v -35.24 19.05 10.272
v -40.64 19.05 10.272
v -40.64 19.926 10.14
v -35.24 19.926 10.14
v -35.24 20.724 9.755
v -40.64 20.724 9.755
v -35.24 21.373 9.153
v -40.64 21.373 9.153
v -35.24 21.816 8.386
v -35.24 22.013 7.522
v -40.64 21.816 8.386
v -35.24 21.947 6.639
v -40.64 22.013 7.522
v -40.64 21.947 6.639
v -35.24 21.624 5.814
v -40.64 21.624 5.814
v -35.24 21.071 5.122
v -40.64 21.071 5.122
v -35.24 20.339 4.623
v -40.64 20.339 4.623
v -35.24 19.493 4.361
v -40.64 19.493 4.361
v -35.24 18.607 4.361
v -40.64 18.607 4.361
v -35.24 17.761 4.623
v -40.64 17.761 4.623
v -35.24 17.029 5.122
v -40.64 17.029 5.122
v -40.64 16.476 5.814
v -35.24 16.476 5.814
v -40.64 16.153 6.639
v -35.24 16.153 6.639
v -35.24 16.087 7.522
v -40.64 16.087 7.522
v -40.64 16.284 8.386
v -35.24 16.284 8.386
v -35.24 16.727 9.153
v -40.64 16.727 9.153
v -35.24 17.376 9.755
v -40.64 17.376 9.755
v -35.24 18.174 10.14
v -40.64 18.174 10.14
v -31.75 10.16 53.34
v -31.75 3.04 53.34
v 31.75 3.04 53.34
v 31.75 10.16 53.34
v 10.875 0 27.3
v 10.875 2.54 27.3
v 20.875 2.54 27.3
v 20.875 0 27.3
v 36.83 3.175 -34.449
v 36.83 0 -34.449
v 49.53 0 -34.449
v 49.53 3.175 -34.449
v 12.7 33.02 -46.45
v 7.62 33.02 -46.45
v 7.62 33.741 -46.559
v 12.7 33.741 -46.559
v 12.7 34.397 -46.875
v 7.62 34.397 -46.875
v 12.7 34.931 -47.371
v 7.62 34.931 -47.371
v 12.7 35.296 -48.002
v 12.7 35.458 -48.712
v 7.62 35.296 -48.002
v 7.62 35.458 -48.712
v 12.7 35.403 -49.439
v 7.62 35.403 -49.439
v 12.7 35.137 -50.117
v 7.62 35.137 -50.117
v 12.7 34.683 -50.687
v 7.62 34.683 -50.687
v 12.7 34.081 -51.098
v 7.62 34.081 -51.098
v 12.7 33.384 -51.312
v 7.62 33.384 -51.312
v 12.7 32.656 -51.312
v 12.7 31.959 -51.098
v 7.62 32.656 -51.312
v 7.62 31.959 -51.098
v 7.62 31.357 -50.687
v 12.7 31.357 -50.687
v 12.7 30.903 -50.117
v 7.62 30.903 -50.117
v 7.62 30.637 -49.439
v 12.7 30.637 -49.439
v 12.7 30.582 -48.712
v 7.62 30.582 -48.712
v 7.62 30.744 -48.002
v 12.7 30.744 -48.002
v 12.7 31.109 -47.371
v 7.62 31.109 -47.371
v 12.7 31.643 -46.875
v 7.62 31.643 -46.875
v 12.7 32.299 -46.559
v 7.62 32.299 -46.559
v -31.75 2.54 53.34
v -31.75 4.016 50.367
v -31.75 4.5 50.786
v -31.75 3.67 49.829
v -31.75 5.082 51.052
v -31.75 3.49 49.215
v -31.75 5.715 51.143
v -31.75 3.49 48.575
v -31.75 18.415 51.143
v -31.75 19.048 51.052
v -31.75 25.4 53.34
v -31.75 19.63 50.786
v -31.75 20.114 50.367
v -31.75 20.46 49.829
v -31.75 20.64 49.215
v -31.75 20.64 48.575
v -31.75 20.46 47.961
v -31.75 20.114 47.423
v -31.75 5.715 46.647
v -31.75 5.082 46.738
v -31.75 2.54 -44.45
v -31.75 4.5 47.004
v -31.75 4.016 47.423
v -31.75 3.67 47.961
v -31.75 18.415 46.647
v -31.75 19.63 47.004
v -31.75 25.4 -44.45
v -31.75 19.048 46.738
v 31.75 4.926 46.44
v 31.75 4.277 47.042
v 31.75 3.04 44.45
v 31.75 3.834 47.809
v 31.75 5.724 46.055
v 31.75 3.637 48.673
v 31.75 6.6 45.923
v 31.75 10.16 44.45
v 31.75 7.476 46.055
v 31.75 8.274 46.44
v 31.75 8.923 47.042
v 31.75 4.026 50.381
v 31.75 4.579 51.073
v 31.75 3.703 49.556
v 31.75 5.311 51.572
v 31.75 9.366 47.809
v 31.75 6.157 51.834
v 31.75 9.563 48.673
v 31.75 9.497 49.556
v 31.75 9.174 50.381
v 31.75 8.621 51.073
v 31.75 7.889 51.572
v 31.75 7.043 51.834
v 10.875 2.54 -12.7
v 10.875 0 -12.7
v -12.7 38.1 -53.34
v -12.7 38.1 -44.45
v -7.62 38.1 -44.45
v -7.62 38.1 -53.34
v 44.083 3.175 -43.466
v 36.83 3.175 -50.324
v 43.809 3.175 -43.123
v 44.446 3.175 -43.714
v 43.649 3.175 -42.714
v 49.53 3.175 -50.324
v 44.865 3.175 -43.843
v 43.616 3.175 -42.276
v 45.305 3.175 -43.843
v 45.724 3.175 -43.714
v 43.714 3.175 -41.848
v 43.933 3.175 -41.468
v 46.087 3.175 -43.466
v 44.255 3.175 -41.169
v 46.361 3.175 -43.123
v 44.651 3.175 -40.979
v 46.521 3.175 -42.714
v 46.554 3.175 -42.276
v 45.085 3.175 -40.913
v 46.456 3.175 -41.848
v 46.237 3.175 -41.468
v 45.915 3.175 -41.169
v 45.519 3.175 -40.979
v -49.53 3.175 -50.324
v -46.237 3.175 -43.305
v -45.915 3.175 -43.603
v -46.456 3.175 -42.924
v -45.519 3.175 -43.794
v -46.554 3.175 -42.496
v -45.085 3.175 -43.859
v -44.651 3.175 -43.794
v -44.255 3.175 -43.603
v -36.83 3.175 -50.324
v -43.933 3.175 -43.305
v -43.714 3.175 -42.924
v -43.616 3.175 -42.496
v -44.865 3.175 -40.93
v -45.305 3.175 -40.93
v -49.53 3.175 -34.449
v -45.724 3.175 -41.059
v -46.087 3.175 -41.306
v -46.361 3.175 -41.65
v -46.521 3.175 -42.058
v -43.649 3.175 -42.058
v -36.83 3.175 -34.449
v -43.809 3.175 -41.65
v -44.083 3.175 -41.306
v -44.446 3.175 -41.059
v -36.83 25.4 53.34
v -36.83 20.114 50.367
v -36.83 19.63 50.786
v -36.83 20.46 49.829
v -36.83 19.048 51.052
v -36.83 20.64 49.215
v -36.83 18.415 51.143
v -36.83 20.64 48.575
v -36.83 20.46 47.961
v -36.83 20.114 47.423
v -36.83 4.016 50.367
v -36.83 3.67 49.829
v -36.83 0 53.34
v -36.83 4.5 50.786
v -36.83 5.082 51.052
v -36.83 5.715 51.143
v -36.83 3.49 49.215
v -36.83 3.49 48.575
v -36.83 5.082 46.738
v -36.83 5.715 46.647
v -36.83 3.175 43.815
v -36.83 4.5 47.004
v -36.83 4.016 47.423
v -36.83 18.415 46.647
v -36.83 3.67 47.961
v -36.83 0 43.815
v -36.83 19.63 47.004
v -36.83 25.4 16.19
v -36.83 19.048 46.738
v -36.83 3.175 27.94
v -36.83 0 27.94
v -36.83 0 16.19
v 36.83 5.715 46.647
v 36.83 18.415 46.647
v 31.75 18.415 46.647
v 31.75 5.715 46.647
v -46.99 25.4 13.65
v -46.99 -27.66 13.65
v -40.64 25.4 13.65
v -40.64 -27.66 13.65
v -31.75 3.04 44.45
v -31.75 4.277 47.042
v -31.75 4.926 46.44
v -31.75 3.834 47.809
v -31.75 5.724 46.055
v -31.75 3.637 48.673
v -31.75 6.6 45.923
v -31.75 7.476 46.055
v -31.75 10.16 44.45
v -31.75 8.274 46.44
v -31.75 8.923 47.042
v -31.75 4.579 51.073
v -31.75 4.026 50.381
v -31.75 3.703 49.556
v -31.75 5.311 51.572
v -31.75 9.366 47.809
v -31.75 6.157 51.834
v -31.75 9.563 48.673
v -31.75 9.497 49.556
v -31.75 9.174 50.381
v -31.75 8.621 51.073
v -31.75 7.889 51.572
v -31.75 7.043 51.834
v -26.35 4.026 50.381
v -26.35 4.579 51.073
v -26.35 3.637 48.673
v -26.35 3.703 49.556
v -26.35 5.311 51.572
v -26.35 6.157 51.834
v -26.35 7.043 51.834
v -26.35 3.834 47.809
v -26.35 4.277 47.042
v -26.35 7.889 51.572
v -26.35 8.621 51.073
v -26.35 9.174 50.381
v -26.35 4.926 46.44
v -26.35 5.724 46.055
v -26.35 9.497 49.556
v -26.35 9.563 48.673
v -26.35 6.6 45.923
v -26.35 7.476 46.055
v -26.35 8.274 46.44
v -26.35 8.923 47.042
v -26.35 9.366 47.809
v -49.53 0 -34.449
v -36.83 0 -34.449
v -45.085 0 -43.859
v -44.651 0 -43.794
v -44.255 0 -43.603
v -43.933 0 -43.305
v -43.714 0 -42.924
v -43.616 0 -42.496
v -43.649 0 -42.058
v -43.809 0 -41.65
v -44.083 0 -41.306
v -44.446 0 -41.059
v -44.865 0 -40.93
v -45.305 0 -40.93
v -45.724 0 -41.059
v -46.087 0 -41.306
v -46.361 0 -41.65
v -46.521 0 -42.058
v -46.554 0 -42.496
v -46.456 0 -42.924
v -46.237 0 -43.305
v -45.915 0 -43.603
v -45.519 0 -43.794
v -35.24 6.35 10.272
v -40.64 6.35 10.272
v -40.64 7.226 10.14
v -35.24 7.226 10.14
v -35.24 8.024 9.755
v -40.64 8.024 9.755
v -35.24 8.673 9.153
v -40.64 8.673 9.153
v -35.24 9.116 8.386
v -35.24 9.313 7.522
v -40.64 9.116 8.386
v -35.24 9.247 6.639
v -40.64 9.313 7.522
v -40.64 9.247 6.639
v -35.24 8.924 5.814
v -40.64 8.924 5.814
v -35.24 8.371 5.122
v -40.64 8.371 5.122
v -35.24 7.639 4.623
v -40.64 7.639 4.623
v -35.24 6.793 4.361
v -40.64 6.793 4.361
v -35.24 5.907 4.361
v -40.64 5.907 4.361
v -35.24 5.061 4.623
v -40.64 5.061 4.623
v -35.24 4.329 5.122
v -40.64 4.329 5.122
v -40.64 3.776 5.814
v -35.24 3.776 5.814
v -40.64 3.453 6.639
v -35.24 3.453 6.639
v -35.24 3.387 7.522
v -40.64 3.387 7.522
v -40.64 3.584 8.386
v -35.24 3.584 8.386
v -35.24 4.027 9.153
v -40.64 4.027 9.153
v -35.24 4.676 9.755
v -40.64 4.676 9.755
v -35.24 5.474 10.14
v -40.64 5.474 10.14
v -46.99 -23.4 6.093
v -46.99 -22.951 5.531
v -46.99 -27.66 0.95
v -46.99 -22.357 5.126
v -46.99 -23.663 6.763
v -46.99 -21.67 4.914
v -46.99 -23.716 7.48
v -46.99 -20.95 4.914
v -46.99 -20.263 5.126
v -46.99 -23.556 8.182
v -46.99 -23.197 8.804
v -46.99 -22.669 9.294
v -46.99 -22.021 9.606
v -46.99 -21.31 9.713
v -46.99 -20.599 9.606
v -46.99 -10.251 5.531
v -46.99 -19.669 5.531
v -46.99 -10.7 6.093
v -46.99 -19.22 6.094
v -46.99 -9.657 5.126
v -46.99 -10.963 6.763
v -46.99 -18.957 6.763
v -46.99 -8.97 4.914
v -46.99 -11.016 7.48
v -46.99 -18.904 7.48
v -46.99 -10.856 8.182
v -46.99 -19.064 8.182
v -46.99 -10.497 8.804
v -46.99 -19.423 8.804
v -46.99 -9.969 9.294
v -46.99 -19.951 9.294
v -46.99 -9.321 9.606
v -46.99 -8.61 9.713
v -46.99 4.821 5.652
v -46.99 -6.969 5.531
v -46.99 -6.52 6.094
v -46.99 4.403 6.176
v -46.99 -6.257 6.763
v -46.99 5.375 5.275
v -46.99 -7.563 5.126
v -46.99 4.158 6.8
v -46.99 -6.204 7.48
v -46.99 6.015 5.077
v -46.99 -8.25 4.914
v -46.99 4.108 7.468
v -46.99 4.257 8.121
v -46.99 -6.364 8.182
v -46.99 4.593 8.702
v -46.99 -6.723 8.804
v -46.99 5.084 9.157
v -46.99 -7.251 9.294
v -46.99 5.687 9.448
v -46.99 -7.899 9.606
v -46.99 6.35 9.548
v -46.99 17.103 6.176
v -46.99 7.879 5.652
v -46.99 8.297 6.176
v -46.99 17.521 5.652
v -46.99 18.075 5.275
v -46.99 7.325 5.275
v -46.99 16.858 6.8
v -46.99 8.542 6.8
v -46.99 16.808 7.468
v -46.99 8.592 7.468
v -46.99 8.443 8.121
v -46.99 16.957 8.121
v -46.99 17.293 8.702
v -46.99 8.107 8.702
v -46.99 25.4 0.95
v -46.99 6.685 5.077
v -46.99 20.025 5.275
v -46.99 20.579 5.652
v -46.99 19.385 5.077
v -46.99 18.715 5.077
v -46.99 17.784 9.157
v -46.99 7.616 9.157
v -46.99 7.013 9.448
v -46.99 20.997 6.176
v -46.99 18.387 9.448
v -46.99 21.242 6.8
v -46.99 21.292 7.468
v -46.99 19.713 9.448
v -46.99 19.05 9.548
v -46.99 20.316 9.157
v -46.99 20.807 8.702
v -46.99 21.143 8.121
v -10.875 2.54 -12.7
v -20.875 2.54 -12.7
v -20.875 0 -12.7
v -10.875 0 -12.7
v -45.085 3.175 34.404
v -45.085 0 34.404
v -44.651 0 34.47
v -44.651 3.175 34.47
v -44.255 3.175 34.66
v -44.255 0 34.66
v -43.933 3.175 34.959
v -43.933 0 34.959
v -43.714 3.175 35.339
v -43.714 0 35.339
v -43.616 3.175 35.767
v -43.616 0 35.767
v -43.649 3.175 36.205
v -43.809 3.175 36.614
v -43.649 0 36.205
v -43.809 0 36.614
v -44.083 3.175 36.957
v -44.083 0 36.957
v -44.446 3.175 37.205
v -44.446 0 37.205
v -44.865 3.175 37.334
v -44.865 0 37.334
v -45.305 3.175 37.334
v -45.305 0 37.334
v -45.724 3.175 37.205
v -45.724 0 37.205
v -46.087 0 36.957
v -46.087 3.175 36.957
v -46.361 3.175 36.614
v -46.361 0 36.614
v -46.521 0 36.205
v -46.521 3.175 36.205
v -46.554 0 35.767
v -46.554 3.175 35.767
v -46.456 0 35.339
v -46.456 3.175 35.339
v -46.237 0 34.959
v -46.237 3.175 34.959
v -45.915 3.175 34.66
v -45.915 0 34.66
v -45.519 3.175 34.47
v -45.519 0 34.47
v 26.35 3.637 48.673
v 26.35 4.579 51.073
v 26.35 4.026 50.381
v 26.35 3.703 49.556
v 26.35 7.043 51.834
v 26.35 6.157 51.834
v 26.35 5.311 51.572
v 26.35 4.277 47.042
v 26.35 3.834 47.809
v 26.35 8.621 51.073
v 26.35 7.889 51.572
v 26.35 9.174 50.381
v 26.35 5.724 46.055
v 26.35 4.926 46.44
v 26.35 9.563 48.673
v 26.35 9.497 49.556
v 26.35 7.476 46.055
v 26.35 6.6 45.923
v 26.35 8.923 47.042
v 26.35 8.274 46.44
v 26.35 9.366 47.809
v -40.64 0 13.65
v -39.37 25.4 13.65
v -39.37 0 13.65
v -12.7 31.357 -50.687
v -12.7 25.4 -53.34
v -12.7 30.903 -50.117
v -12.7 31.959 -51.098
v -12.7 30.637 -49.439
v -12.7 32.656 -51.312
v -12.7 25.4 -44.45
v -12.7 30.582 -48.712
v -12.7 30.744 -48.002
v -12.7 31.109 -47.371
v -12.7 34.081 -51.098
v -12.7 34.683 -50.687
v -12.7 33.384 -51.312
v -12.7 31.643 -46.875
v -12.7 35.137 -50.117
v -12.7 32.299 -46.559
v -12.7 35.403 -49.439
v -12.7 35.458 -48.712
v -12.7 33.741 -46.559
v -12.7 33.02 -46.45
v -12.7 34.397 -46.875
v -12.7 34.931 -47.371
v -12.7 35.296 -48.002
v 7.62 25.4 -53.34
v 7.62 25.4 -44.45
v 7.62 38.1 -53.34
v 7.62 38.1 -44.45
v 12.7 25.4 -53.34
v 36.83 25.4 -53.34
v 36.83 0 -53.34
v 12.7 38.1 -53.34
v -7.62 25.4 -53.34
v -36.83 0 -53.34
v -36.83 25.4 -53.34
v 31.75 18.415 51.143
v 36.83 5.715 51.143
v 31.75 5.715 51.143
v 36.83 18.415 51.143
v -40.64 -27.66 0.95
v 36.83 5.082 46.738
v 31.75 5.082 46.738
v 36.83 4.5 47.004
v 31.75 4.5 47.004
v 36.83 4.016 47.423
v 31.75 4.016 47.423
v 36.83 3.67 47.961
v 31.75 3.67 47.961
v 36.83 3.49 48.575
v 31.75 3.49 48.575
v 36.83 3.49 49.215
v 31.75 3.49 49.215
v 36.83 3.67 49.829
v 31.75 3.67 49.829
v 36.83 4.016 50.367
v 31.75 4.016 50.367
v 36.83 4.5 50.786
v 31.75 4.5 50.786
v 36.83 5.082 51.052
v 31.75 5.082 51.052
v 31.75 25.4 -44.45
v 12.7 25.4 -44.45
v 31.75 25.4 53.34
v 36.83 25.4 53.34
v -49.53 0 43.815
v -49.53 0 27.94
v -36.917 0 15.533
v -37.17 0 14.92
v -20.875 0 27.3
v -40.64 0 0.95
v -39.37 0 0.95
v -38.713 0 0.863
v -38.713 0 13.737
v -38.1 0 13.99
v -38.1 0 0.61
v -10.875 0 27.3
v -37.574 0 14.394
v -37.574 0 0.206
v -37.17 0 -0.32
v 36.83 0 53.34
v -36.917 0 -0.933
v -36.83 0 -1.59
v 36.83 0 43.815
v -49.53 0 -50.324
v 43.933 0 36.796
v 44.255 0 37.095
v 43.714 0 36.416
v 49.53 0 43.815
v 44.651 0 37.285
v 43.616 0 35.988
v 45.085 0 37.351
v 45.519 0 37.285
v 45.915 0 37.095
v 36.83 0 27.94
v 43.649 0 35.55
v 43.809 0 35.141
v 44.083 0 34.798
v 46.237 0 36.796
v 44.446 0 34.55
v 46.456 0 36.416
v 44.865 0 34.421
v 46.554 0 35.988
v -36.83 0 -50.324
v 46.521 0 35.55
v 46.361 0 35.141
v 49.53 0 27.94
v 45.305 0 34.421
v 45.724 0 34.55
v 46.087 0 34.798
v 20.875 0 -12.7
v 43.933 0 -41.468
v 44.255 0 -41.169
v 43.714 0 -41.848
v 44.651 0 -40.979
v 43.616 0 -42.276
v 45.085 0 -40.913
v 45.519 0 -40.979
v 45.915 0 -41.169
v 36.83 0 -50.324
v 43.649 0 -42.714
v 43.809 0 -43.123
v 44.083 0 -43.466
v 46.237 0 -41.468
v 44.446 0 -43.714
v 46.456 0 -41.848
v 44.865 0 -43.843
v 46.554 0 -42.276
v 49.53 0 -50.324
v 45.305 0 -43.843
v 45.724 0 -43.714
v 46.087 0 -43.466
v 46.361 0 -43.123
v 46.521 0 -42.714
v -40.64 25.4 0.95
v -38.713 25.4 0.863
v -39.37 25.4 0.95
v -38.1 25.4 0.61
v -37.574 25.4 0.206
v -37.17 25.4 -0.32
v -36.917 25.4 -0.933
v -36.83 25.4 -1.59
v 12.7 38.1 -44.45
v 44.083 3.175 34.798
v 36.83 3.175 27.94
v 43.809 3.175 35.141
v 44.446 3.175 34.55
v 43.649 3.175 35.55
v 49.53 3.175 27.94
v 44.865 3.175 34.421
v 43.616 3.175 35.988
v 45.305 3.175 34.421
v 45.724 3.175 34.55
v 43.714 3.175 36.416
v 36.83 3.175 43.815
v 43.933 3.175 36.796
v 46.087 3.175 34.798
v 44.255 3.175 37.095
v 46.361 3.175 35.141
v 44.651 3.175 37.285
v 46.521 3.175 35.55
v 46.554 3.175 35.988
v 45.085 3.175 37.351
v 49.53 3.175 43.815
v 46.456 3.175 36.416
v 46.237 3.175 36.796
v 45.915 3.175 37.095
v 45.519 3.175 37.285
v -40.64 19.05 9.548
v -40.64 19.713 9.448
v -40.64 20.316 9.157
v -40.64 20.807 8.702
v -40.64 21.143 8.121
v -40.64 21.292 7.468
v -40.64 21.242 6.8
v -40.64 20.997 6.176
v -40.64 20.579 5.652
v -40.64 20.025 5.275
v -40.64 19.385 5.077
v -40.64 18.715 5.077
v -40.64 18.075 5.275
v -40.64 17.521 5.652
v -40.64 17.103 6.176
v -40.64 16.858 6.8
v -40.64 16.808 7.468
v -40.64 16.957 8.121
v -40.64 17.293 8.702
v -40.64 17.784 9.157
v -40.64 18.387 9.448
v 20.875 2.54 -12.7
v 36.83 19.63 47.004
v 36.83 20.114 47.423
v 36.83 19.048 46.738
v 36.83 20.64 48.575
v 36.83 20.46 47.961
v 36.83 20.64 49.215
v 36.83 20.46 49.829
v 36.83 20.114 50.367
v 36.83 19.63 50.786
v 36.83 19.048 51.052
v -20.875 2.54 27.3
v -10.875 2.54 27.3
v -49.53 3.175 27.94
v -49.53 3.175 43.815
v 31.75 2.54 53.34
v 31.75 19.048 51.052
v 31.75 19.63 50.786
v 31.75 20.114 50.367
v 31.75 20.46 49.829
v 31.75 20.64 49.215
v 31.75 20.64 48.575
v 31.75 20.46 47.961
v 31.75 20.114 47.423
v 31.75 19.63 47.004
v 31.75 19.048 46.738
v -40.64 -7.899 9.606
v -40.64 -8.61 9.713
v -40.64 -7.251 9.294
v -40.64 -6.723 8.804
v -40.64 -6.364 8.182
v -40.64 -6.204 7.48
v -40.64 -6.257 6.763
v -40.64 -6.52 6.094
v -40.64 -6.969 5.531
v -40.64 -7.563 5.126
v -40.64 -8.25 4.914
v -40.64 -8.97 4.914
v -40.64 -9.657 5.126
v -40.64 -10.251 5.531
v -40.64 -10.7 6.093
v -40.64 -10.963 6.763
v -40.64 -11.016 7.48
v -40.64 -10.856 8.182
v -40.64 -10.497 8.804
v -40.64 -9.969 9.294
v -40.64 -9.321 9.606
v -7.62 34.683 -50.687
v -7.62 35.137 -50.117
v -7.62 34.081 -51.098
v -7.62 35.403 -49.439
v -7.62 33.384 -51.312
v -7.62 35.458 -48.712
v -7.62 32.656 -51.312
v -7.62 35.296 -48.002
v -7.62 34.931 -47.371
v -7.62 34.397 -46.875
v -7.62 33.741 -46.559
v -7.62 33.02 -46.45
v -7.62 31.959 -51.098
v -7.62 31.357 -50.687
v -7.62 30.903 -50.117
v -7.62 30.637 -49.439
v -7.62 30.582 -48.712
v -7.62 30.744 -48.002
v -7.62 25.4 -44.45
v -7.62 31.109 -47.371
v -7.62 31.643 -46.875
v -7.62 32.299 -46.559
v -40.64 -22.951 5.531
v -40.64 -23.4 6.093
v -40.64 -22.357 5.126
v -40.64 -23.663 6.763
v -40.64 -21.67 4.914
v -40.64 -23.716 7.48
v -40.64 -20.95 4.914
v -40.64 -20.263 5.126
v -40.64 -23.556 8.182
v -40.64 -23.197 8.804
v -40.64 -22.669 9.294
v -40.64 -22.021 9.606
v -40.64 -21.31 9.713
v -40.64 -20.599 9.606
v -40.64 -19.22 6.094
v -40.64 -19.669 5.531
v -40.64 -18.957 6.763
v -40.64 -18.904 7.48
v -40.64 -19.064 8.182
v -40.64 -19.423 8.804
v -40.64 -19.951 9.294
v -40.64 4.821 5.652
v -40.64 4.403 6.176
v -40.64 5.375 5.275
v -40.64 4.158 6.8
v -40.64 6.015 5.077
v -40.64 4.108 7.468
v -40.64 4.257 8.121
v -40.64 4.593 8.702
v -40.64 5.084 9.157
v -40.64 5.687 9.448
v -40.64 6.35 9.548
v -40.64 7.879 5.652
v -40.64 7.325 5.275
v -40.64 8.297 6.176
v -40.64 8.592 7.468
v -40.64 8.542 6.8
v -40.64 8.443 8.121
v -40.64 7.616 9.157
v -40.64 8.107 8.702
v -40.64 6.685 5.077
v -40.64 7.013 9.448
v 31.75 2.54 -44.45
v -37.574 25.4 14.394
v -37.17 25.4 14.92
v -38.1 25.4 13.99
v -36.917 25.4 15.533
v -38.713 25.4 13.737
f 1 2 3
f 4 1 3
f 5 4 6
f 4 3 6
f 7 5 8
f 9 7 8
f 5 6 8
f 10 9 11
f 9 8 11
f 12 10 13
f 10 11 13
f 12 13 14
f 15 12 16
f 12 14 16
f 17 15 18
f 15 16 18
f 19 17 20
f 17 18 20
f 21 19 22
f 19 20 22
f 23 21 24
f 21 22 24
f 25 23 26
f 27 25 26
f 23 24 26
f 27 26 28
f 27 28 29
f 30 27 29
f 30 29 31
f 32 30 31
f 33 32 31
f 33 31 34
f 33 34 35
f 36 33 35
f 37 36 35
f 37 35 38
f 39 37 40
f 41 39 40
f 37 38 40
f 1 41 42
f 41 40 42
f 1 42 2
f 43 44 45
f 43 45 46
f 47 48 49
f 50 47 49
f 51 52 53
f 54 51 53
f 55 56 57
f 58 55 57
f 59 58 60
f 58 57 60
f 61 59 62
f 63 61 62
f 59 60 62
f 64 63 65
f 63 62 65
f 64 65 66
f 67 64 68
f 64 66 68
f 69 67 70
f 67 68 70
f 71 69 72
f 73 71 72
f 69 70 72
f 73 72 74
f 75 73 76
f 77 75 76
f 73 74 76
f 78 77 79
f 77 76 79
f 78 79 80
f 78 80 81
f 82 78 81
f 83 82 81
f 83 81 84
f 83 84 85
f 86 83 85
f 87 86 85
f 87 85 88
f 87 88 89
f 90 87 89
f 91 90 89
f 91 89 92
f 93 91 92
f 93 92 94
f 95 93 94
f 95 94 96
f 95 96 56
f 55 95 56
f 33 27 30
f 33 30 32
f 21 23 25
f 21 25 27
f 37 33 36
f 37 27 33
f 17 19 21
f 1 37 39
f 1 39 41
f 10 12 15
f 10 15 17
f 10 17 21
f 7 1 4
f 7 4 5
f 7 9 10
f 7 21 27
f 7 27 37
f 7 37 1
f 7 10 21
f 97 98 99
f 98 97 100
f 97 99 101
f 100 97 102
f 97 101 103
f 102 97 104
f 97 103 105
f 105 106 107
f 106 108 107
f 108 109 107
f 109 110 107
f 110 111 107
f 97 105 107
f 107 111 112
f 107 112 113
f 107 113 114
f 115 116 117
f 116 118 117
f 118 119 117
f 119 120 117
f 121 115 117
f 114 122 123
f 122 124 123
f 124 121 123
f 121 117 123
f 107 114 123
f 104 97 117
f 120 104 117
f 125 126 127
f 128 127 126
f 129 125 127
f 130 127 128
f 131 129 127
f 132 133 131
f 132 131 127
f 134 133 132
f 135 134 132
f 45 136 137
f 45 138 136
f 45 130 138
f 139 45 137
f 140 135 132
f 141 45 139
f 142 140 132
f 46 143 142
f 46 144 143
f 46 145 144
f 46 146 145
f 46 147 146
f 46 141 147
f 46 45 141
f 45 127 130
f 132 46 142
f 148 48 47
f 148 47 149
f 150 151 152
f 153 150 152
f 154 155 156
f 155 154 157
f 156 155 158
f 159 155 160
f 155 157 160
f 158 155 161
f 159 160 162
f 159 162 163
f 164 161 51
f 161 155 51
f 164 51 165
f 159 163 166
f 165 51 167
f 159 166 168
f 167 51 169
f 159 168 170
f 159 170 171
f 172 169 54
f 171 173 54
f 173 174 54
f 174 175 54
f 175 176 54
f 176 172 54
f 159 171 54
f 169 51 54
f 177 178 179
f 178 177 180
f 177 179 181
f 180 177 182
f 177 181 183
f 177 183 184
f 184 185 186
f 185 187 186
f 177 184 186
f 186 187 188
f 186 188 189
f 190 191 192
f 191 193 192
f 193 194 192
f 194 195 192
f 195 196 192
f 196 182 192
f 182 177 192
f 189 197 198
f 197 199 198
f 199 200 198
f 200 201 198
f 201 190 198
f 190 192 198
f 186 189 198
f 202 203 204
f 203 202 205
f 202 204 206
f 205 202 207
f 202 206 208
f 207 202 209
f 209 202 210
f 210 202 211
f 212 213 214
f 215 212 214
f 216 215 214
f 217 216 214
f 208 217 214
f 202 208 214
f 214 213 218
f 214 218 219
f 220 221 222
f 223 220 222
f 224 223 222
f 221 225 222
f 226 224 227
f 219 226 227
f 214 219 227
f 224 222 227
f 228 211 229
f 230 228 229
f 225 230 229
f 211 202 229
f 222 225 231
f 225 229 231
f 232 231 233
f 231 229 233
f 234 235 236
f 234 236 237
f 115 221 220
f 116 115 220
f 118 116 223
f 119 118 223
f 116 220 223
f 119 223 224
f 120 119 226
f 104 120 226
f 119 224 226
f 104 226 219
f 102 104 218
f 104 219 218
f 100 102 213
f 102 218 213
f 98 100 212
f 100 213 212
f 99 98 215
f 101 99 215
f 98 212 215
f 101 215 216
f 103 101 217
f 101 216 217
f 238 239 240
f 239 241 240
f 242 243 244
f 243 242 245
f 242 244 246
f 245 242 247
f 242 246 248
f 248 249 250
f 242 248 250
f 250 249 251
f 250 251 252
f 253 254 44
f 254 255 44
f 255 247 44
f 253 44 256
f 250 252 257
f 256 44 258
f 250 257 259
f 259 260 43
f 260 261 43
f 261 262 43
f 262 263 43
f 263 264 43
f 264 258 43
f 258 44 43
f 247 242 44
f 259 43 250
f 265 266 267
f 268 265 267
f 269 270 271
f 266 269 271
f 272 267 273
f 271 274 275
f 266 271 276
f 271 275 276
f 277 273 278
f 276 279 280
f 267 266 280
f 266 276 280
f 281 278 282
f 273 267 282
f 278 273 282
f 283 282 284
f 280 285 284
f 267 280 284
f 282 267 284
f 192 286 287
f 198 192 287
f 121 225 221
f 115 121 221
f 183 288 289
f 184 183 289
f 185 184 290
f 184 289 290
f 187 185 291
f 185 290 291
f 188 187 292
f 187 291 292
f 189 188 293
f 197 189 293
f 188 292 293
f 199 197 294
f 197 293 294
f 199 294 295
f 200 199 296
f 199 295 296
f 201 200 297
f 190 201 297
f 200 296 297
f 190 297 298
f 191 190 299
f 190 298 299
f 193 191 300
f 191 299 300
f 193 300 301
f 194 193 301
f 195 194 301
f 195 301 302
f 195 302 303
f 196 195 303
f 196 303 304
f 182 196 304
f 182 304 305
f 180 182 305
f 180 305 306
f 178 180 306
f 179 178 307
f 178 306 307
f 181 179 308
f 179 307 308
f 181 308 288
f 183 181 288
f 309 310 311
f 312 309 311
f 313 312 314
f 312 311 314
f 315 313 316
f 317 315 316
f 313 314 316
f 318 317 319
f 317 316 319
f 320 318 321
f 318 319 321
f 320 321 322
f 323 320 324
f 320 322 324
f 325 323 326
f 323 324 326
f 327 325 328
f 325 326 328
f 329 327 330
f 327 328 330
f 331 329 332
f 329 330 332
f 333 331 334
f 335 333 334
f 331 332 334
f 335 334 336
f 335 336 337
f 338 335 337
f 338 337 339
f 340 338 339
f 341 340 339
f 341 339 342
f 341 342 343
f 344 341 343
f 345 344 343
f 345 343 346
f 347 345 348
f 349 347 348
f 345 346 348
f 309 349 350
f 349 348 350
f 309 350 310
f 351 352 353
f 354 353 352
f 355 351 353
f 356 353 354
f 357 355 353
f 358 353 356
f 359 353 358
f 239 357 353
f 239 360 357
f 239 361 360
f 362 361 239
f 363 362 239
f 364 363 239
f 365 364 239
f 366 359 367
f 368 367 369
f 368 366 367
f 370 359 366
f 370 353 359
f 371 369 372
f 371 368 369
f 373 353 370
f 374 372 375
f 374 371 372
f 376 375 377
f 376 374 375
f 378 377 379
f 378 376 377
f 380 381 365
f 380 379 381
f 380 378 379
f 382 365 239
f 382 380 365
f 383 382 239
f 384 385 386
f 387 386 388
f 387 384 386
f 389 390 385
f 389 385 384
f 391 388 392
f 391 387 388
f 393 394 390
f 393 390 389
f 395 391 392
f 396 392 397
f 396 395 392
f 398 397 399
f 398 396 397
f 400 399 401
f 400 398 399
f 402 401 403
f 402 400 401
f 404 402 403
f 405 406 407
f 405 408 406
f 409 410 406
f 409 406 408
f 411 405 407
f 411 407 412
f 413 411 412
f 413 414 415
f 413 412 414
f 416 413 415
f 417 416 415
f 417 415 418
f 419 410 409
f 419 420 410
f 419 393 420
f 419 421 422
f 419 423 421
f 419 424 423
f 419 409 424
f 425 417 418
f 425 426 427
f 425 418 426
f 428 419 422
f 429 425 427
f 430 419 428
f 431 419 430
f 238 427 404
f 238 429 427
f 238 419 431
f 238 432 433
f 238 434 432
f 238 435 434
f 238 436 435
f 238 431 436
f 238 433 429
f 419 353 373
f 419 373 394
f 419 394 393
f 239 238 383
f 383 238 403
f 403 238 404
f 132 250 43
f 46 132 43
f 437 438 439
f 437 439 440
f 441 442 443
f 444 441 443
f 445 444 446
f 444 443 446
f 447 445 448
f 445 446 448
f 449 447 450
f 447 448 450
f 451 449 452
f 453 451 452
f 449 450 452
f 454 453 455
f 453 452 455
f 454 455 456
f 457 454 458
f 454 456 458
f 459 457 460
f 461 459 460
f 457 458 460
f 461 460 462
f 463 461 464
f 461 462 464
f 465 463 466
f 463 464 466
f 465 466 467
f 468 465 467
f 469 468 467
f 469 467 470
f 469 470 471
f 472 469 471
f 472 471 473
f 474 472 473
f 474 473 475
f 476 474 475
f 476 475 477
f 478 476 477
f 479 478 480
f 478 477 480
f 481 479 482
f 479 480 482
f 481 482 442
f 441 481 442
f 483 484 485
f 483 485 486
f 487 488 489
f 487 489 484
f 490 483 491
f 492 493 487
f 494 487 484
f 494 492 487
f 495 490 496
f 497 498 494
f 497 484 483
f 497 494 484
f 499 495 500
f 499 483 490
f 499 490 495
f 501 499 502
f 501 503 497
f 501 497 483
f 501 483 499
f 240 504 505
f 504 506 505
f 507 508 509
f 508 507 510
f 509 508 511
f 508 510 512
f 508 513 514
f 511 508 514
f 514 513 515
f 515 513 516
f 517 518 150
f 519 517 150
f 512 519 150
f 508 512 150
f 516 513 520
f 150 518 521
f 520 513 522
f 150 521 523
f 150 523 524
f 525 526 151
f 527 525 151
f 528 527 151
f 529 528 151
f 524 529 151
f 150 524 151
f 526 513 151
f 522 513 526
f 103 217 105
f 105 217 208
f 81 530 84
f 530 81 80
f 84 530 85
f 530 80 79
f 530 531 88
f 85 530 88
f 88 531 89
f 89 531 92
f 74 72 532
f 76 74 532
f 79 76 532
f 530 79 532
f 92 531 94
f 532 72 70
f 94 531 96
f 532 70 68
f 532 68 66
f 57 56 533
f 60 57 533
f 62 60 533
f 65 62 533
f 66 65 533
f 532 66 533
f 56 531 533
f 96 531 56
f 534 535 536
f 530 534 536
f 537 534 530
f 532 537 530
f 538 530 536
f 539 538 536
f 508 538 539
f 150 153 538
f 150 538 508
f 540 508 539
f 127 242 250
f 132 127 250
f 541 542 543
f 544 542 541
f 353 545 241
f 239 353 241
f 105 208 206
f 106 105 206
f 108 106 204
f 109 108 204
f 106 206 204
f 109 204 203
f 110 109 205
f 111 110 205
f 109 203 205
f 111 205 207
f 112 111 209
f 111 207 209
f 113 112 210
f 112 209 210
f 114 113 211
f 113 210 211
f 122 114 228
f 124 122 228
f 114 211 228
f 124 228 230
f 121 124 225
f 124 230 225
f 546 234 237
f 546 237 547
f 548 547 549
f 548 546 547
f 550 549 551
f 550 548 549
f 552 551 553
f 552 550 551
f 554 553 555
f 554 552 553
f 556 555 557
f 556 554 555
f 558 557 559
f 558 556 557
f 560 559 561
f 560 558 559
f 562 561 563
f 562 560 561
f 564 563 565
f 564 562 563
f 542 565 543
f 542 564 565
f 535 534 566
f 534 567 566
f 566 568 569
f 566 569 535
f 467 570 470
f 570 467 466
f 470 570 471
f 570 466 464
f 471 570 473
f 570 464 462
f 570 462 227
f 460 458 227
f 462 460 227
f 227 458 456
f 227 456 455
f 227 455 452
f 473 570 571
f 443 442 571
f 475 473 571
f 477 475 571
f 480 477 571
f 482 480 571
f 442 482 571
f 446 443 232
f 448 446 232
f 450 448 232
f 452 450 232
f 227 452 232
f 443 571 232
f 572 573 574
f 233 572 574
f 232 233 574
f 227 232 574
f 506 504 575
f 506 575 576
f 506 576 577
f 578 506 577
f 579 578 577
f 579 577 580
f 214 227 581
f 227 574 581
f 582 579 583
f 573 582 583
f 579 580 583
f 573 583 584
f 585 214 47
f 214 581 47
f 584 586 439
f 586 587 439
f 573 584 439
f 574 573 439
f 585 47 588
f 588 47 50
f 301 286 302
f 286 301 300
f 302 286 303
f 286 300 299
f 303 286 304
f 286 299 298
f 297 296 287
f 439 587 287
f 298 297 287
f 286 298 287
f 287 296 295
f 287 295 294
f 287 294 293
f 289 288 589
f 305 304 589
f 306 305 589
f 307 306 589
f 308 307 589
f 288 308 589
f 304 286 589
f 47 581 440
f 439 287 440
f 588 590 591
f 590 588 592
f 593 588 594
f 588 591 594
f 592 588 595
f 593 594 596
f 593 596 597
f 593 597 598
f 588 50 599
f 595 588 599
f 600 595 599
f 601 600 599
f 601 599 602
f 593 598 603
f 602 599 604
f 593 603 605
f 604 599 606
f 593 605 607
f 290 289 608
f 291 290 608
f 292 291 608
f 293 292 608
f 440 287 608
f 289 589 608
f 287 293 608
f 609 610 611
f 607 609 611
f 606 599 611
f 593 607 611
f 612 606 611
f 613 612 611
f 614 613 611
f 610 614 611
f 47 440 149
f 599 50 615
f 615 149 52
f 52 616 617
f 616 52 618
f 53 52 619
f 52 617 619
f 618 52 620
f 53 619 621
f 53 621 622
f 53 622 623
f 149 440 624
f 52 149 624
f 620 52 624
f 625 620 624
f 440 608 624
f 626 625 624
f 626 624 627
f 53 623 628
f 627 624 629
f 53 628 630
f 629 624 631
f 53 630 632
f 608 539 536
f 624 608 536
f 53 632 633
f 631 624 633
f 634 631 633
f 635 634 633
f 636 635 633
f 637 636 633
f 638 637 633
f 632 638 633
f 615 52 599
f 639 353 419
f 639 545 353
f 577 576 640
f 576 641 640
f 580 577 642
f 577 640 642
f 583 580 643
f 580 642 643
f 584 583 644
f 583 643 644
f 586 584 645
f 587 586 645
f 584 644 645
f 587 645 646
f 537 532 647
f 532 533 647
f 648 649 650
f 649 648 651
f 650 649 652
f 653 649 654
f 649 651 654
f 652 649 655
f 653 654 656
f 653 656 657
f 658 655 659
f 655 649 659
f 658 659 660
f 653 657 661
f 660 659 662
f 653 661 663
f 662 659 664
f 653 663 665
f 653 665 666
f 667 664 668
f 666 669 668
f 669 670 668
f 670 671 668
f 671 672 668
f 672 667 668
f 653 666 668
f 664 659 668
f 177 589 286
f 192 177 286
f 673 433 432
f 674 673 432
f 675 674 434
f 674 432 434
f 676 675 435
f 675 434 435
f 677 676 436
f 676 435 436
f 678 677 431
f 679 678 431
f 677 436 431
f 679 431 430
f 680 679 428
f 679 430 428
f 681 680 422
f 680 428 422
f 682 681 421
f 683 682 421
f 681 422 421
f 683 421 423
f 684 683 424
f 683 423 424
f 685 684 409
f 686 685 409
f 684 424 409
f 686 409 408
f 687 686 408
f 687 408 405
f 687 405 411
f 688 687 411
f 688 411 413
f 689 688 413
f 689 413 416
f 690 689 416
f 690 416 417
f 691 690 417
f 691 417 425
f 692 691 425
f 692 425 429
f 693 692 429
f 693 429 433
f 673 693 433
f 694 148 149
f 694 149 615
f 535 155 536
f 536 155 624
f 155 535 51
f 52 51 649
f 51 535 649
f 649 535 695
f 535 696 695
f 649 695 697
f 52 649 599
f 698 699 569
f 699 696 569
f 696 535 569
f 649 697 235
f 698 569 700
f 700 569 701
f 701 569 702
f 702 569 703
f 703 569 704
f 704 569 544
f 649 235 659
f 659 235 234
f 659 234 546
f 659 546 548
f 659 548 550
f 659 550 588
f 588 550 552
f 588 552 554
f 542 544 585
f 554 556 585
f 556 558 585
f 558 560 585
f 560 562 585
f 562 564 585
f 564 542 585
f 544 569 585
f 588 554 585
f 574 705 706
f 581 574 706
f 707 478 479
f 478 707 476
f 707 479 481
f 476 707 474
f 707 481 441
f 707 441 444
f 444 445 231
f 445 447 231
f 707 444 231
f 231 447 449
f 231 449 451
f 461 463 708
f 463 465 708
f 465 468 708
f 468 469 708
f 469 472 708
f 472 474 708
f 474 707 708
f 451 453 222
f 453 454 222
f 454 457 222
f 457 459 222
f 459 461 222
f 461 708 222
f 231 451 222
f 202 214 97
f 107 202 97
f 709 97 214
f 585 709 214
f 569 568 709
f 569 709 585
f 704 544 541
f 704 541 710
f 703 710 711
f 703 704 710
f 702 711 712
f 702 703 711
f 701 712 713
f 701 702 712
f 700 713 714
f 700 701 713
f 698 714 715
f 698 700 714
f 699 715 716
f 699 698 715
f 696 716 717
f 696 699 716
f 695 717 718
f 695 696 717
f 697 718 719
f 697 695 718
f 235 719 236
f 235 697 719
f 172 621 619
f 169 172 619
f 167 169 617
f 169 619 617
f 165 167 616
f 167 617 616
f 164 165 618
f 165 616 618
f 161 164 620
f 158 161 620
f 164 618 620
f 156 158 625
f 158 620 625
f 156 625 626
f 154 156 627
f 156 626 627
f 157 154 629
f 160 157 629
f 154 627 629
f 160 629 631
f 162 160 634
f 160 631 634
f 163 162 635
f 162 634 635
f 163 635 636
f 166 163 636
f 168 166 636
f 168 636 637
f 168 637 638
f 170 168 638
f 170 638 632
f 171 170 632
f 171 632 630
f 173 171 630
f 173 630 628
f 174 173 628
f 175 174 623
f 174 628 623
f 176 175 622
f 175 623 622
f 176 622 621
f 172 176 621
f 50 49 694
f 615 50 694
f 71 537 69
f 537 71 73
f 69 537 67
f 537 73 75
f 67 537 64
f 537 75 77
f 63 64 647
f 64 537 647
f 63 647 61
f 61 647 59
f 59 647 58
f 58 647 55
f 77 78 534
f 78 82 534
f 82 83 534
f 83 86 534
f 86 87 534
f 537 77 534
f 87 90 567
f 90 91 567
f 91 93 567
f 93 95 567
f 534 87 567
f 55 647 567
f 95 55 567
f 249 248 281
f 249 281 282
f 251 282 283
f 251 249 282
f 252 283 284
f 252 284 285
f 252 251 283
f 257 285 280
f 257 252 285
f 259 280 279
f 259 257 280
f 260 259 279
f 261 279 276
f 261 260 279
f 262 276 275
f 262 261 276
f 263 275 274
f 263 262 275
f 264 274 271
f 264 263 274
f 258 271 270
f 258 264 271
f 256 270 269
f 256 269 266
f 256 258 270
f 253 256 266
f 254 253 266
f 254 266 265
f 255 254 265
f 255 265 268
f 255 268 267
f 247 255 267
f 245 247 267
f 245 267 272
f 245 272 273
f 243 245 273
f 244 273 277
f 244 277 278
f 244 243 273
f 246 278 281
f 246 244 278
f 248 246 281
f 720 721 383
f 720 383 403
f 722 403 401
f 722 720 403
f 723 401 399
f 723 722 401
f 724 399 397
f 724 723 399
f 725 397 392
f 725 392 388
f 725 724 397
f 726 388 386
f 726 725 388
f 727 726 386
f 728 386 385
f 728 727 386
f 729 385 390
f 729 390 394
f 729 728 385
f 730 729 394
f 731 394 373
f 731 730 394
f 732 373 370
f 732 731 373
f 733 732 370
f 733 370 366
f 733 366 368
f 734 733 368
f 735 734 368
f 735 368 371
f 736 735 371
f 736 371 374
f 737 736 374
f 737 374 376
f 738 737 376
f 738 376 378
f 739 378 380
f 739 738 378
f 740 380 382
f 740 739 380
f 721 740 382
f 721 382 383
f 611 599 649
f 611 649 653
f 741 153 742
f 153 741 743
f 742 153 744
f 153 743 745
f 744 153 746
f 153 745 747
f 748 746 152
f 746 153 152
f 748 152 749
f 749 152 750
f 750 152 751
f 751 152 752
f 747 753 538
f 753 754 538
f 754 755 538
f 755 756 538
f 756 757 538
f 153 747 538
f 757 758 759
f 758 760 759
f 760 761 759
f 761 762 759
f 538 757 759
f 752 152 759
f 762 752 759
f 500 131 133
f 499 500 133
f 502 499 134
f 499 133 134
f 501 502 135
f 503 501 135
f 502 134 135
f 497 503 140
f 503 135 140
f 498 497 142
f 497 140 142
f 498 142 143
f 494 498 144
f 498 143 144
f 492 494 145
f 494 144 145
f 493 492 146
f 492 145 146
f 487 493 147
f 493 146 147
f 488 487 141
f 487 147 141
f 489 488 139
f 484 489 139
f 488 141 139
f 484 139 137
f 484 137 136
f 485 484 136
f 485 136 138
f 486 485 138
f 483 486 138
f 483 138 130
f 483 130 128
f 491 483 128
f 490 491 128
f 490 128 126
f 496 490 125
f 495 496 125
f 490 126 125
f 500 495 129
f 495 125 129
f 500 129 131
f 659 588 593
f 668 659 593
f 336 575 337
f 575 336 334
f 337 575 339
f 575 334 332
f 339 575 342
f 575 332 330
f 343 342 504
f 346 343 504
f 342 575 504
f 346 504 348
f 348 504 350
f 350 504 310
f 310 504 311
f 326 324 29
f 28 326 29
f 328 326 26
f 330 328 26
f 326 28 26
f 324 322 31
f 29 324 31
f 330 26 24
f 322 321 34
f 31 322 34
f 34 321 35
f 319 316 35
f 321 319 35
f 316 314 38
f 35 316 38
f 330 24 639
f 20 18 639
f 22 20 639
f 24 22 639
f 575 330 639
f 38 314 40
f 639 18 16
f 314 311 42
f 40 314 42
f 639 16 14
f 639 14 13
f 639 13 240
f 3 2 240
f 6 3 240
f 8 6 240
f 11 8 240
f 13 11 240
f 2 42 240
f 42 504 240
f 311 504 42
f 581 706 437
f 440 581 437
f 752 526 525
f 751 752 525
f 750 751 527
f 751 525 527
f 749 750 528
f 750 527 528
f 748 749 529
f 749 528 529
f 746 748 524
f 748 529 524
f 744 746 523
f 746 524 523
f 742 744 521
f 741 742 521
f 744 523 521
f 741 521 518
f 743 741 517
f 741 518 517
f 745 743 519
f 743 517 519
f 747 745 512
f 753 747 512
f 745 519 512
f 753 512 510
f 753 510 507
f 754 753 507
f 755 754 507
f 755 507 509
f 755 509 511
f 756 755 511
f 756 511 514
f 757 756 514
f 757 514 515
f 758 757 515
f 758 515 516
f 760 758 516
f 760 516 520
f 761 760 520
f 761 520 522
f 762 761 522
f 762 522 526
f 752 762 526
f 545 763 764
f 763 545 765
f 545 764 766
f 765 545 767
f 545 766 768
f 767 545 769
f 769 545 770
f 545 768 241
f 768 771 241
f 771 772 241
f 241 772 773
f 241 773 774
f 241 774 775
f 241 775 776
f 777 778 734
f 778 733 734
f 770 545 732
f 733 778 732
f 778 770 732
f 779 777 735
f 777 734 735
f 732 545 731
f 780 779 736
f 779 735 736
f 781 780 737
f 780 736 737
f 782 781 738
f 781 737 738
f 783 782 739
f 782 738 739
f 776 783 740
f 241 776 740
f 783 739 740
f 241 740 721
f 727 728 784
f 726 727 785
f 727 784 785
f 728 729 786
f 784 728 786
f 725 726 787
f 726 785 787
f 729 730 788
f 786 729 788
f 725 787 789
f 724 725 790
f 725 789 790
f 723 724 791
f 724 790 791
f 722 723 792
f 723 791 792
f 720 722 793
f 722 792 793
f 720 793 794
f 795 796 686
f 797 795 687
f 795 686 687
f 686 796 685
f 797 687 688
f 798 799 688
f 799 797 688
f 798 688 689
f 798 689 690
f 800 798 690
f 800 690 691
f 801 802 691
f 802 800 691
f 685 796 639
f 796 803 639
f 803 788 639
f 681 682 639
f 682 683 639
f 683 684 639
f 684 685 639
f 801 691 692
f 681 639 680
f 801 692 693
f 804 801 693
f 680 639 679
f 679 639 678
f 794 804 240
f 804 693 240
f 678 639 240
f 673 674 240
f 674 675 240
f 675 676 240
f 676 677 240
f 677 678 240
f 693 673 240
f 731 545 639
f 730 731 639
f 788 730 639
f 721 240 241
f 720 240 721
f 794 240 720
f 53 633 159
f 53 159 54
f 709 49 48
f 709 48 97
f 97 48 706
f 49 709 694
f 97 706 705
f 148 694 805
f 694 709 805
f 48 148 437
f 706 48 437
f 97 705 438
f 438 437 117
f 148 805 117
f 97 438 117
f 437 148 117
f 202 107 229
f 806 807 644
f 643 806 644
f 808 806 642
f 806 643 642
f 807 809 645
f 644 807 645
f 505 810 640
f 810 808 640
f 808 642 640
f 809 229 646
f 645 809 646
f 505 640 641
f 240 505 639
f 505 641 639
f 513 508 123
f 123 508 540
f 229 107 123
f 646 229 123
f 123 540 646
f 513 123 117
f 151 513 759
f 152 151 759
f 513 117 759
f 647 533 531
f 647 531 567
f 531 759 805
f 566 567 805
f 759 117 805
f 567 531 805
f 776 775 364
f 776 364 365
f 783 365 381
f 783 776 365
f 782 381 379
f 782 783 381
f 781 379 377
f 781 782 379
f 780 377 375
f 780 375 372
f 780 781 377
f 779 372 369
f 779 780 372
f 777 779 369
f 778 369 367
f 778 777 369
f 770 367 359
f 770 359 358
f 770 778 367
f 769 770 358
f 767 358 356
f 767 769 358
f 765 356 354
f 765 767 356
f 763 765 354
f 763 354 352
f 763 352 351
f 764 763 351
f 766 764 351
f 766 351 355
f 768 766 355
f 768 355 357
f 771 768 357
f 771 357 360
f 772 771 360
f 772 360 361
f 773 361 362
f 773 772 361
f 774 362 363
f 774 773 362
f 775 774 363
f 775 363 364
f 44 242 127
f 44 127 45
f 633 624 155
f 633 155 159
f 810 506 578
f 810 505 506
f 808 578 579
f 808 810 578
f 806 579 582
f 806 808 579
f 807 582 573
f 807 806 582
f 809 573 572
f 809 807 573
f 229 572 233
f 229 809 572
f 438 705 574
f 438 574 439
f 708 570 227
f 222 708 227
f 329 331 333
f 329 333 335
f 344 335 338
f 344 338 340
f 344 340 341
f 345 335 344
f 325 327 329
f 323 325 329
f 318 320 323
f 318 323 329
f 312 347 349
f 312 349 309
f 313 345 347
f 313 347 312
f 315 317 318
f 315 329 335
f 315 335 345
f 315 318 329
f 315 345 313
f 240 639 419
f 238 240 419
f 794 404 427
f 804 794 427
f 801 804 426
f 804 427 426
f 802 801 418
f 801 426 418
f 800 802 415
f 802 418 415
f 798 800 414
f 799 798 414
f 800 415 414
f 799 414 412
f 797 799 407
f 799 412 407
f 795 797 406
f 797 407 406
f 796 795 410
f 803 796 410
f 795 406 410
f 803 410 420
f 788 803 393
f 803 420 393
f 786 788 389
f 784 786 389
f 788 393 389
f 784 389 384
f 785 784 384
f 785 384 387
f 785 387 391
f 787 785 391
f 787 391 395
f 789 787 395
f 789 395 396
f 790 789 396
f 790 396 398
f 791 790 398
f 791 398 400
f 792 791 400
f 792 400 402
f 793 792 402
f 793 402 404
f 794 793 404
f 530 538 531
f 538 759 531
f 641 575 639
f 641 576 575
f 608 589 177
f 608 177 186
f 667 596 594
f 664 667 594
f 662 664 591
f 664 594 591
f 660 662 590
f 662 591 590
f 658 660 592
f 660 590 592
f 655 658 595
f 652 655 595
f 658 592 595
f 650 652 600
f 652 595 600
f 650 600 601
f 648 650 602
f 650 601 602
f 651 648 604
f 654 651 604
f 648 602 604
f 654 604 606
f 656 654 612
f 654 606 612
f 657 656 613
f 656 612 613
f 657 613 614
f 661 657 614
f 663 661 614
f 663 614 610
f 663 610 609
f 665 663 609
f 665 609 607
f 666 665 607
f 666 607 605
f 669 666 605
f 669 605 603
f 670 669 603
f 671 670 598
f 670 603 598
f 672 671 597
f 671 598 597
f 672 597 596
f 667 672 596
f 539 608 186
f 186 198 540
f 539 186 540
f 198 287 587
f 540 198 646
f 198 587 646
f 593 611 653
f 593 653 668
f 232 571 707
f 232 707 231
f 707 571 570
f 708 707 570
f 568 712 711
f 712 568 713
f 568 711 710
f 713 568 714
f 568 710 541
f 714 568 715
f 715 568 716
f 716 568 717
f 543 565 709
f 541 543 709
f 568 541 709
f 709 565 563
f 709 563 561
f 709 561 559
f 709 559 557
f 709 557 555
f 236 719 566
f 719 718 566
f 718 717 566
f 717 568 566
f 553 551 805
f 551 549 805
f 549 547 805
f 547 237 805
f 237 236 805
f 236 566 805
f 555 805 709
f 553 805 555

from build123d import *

# Parameters (mm, degrees)
SKETCH3_W                  = 63.5
SKETCH3_H                  = 88.9
BOSS_EXTRUDE1_DEPTH        = 2.54
BOSS_EXTRUDE2_DEPTH        = 25.4
SKETCH11_W                 = 25.4
SKETCH11_H                 = 5.08
BOSS_EXTRUDE10_DEPTH       = 12.7
SKETCH12_W                 = 15.24
SKETCH12_H                 = 5.08
CUT_EXTRUDE3_DEPTH         = 12.7
BOSS_EXTRUDE11_DEPTH       = 3.81
SKETCH13_R                 = 2.44475
CUT_EXTRUDE4_DEPTH         = 83.158301467
SKETCH5_W                  = 10
SKETCH5_H                  = 40
WHEEL_CUTOUTS_DEPTH        = 74.933200255
SKETCH7_W                  = 12.7
SKETCH7_H                  = 25.4
BOSS_EXTRUDE4_DEPTH        = 3.81
SKETCH8_W                  = 12.7
SKETCH8_H                  = 53.06
SKETCH8_R                  = 2.413
BOSS_EXTRUDE5_DEPTH        = 6.35
FILLET1_R                  = 2.54
BOSS_EXTRUDE9_START        = -2.54
SKETCH9_W                  = 63.5
SKETCH9_H                  = 8.89
BOSS_EXTRUDE9_DEPTH        = 10.16
CUT_EXTRUDE2_REACH         = 116.989
SKETCH10_W                 = 63.5
SKETCH10_H                 = 0.5
SPLIT2_START               = -31.75
SPLIT2_OUTLINE_W           = 7.12
SPLIT2_OUTLINE_H           = 8.89
SPLIT2_DEPTH               = 63.5
SPLIT2_2_OUTLINE_W         = 7.12
SPLIT2_2_OUTLINE_H         = 8.89
SPLIT2_2_DEPTH             = 63.5
SKETCH15_R                 = 2.9718
HEATSERT_HOLES_DEPTH       = 5.4
EXTRA_LENGTH_DEPTH         = 3.81
SLOT_DEPTH                 = 68.58
SKETCH18_R                 = 2.9718
MOTOR_HEATSERT_HOLES_DEPTH = 5.4
SKETCH19_R                 = 2.2479
CUT_EXTRUDE6_DEPTH         = 107.407509134
SKETCH20_W                 = 12.7
SKETCH20_H                 = 15.875
SKETCH20_R                 = 1.4732
FEET_DEPTH                 = 3.175


# Read off the part's stored shape, not the designer's step: Split2, Split3
with BuildPart() as part:
    # Sketch3 → Boss-Extrude1 (new body)
    with BuildSketch(Plane(origin=(0, 0, 0), x_dir=(1, 0, 0), z_dir=(0, 1, 0))):
        Rectangle(SKETCH3_W, SKETCH3_H)
    extrude(amount=BOSS_EXTRUDE1_DEPTH)

    # Sketch4 → Boss-Extrude2 (add)
    with BuildSketch(Plane(origin=(0, 0, 0), x_dir=(1, 0, 0), z_dir=(0, 1, 0))):
        Polygon((-31.75, -44.45), (-31.75, 44.45), (31.75, 44.45), (31.75, -44.45), (31.75, -49.53), (36.83, -49.53), (36.83, 49.53), (-36.83, 49.53), (-36.83, -49.53), (-31.75, -49.53), align=None)
    extrude(amount=BOSS_EXTRUDE2_DEPTH)

    # Sketch11 → Boss-Extrude10 (add)
    with BuildSketch(Plane(origin=(0, 25.4, 0), x_dir=(1, 0, 0), z_dir=(0, 1, 0))):
        with Locations((0, 46.99)):
            Rectangle(SKETCH11_W, SKETCH11_H)
    extrude(amount=BOSS_EXTRUDE10_DEPTH)

    # Sketch12 → Cut-Extrude3 (cut)
    with BuildSketch(Plane(origin=(0, 38.1, 0), x_dir=(1, 0, 0), z_dir=(0, 1, 0))):
        with Locations((0, 46.99)):
            Rectangle(SKETCH12_W, SKETCH12_H)
    extrude(amount=-CUT_EXTRUDE3_DEPTH, mode=Mode.SUBTRACT)

    # Sketch14 → Boss-Extrude11 (add)
    with BuildSketch(Plane(origin=(0, 0, -49.53), x_dir=(-1, 0, 0), z_dir=(0, 0, -1))):
        Polygon((12.7, 38.1), (7.62, 38.1), (7.62, 25.4), (-7.62, 25.4), (-7.62, 38.1), (-12.7, 38.1), (-12.7, 25.4), (-36.83, 25.4), (-36.83, 0), (36.83, 0), (36.83, 25.4), (12.7, 25.4), align=None)
    extrude(amount=BOSS_EXTRUDE11_DEPTH)

    # Sketch13 → Cut-Extrude4 (cut, through all)
    with BuildSketch(Plane.ZY.offset(12.7)):
        with Locations((-48.895, 33.02)):
            Circle(SKETCH13_R)
    extrude(amount=-CUT_EXTRUDE4_DEPTH, mode=Mode.SUBTRACT)

    # Sketch5 → Wheel Cutouts (cut, through all)
    with BuildSketch(Plane(origin=(0, 2.54, 0), x_dir=(1, 0, 0), z_dir=(0, 1, 0))):
        with Locations((15.875, -7.3)):
            Rectangle(SKETCH5_W, SKETCH5_H)
        with Locations((-15.875, -7.3)):
            Rectangle(SKETCH5_W, SKETCH5_H)
    extrude(amount=-WHEEL_CUTOUTS_DEPTH, mode=Mode.SUBTRACT)

    # Sketch7 → Boss-Extrude4 (add)
    with BuildSketch(Plane.ZY.offset(36.83)):
        with Locations((7.3, 12.7)):
            Rectangle(SKETCH7_W, SKETCH7_H)
    extrude(amount=BOSS_EXTRUDE4_DEPTH)

    # Sketch8 → Boss-Extrude5 (add)
    with BuildSketch(Plane.ZY.offset(40.64)):
        with Locations((7.3, -1.13)):
            Rectangle(SKETCH8_W, SKETCH8_H)
        with Locations((7.3, -21.31)):
            Circle(SKETCH8_R, mode=Mode.SUBTRACT)
        with Locations((7.3, -8.61)):
            Circle(SKETCH8_R, mode=Mode.SUBTRACT)
    extrude(amount=BOSS_EXTRUDE5_DEPTH)

    # Fillet1
    fillet1_edges = [part.edges().sort_by_distance(p)[0] for p in [
        (-36.83, 12.7, 0.95),
        (-36.83, 12.7, 13.65),
    ]]
    fillet(fillet1_edges, radius=FILLET1_R)

    # Sketch9 → Boss-Extrude9 (add)
    with BuildSketch(Plane(origin=(0, 2.54, 0), x_dir=(1, 0, 0), z_dir=(0, 1, 0)).offset(BOSS_EXTRUDE9_START)):
        with Locations((0, -48.895)):
            Rectangle(SKETCH9_W, SKETCH9_H)
    extrude(amount=BOSS_EXTRUDE9_DEPTH)

    # Cut-Extrude2: up to this face of the body (flat: up to its plane)
    cut_extrude2_end = Plane(part.part.faces().sort_by_distance((0, 5.08, 53.34))[0])
    # Sketch10 → Cut-Extrude2 (cut, up to the picked face)
    with BuildSketch(Plane(origin=(0, 0, 44.45), x_dir=(-1, 0, 0), z_dir=(0, 0, -1)), mode=Mode.PRIVATE) as cut_extrude2_sk1:
        with Locations((0, 2.79)):
            Rectangle(SKETCH10_W, SKETCH10_H)
    cut_extrude2_tool1 = split(extrude(cut_extrude2_sk1.sketch, amount=-CUT_EXTRUDE2_REACH, mode=Mode.PRIVATE), bisect_by=cut_extrude2_end, keep=Keep.BOTH, mode=Mode.PRIVATE)
    add(cut_extrude2_tool1.solids().sort_by(Axis((0, 2.79, 44.45), (0, 0, 1)))[0], mode=Mode.SUBTRACT)

    # Split2 outline → Split2 (cut)
    with BuildSketch(Plane.YZ.offset(SPLIT2_START)):
        with Locations((6.6, 48.895)):
            Rectangle(SPLIT2_OUTLINE_W, SPLIT2_OUTLINE_H)
    extrude(amount=SPLIT2_DEPTH, mode=Mode.SUBTRACT)

    # Sketch16 → Extra Length (add)
    with BuildSketch(Plane.XY.offset(49.53)):
        Polygon((-36.83, 0), (-31.75, 0), (-31.75, 2.54), (-31.75, 25.4), (-36.83, 25.4), align=None)
        Polygon((31.75, 0), (36.83, 0), (36.83, 25.4), (31.75, 25.4), (31.75, 2.54), align=None)
    extrude(amount=EXTRA_LENGTH_DEPTH)

    # Sketch17 → Slot (cut)
    with BuildSketch(Plane(origin=(36.83, 0, 0), x_dir=(0, 0, -1), z_dir=(1, 0, 0))):
        with BuildLine():
            Line((-51.1429, 5.715), (-51.1429, 18.415))
            ThreePointArc((-51.1429, 18.415), (-48.895, 20.6629), (-46.6471, 18.415))
            Line((-46.6471, 18.415), (-46.6471, 5.715))
            ThreePointArc((-46.6471, 5.715), (-48.895, 3.4671), (-51.1429, 5.715))
        make_face()
    slot = extrude(amount=-SLOT_DEPTH, mode=Mode.SUBTRACT)

    # Mirror3: Slot across plane
    add(slot.mirror(Plane(origin=(0, 0, 0), x_dir=(0, 0, 1), z_dir=(1, 0, 0))), mode=Mode.SUBTRACT)


with BuildPart() as body_2:
    # Split2 2 outline → Split2 2 (new body)
    with BuildSketch(Plane.YZ.offset(SPLIT2_START)):
        with Locations((6.6, 48.895)):
            Rectangle(SPLIT2_2_OUTLINE_W, SPLIT2_2_OUTLINE_H)
    extrude(amount=SPLIT2_2_DEPTH)

    # Sketch15 → Heatsert Holes (cut)
    with BuildSketch(Plane(origin=(31.75, 0, 0), x_dir=(0, 0, -1), z_dir=(1, 0, 0))):
        with Locations((-48.895, 6.6)):
            Circle(SKETCH15_R)
    heatsert_holes = extrude(amount=-HEATSERT_HOLES_DEPTH, mode=Mode.SUBTRACT)

    # Mirror1: Heatsert Holes across plane
    add(heatsert_holes.mirror(Plane(origin=(0, 0, 0), x_dir=(0, 0, 1), z_dir=(1, 0, 0))), mode=Mode.SUBTRACT)


with BuildPart() as body_3:
    # Split3: the piece on the far side of the plane
    add(part.part)
    split(bisect_by=Plane.YZ.offset(-40.64), keep=Keep.BOTTOM)

    # Sketch19 → Cut-Extrude6 (cut, through all)
    with BuildSketch(Plane.ZY.offset(46.99)):
        with Locations((7.3, 19.05)):
            Circle(SKETCH19_R)
        with Locations((7.3, 6.35)):
            Circle(SKETCH19_R)
    extrude(amount=-CUT_EXTRUDE6_DEPTH, mode=Mode.SUBTRACT)


with BuildPart() as part_1:
    add(part.part)

    # Split3
    split(bisect_by=Plane.YZ.offset(-40.64), keep=Keep.TOP)

    # Sketch18 → Motor Heatsert Holes (cut)
    with BuildSketch(Plane.ZY.offset(40.64)):
        with Locations((7.3, 19.05)):
            Circle(SKETCH18_R)
        with Locations((7.3, 6.35)):
            Circle(SKETCH18_R)
    extrude(amount=-MOTOR_HEATSERT_HOLES_DEPTH, mode=Mode.SUBTRACT)

    # Sketch20 → Feet (add)
    # profile 1 of 4: a face of its own
    with BuildSketch(Plane.XZ):
        with Locations((-43.18, 35.8775)):
            Rectangle(SKETCH20_W, SKETCH20_H)
        with Locations(Location((-45.085, 35.8775, 0), (0, 0, 270))):
            Circle(SKETCH20_R, mode=Mode.SUBTRACT)
    # profile 2 of 4: a face of its own
    with BuildSketch(Plane.XZ):
        with Locations((-43.18, -42.38625)):
            Rectangle(SKETCH20_W, SKETCH20_H)
        with Locations(Location((-45.085, -42.38625, 0), (0, 0, 270))):
            Circle(SKETCH20_R, mode=Mode.SUBTRACT)
    # profile 3 of 4: a face of its own
    with BuildSketch(Plane.XZ):
        with Locations((43.18, -42.38625)):
            Rectangle(SKETCH20_W, SKETCH20_H)
        with Locations(Location((45.085, -42.38625, 0), (0, 0, 90))):
            Circle(SKETCH20_R, mode=Mode.SUBTRACT)
    # profile 4 of 4: a face of its own
    with BuildSketch(Plane.XZ):
        with Locations((43.18, 35.8775)):
            Rectangle(SKETCH20_W, SKETCH20_H)
        with Locations(Location((45.085, 35.8775, 0), (0, 0, 90))):
            Circle(SKETCH20_R, mode=Mode.SUBTRACT)
    extrude(amount=-FEET_DEPTH)


solid = Compound([body_2.part, body_3.part, part_1.part])
